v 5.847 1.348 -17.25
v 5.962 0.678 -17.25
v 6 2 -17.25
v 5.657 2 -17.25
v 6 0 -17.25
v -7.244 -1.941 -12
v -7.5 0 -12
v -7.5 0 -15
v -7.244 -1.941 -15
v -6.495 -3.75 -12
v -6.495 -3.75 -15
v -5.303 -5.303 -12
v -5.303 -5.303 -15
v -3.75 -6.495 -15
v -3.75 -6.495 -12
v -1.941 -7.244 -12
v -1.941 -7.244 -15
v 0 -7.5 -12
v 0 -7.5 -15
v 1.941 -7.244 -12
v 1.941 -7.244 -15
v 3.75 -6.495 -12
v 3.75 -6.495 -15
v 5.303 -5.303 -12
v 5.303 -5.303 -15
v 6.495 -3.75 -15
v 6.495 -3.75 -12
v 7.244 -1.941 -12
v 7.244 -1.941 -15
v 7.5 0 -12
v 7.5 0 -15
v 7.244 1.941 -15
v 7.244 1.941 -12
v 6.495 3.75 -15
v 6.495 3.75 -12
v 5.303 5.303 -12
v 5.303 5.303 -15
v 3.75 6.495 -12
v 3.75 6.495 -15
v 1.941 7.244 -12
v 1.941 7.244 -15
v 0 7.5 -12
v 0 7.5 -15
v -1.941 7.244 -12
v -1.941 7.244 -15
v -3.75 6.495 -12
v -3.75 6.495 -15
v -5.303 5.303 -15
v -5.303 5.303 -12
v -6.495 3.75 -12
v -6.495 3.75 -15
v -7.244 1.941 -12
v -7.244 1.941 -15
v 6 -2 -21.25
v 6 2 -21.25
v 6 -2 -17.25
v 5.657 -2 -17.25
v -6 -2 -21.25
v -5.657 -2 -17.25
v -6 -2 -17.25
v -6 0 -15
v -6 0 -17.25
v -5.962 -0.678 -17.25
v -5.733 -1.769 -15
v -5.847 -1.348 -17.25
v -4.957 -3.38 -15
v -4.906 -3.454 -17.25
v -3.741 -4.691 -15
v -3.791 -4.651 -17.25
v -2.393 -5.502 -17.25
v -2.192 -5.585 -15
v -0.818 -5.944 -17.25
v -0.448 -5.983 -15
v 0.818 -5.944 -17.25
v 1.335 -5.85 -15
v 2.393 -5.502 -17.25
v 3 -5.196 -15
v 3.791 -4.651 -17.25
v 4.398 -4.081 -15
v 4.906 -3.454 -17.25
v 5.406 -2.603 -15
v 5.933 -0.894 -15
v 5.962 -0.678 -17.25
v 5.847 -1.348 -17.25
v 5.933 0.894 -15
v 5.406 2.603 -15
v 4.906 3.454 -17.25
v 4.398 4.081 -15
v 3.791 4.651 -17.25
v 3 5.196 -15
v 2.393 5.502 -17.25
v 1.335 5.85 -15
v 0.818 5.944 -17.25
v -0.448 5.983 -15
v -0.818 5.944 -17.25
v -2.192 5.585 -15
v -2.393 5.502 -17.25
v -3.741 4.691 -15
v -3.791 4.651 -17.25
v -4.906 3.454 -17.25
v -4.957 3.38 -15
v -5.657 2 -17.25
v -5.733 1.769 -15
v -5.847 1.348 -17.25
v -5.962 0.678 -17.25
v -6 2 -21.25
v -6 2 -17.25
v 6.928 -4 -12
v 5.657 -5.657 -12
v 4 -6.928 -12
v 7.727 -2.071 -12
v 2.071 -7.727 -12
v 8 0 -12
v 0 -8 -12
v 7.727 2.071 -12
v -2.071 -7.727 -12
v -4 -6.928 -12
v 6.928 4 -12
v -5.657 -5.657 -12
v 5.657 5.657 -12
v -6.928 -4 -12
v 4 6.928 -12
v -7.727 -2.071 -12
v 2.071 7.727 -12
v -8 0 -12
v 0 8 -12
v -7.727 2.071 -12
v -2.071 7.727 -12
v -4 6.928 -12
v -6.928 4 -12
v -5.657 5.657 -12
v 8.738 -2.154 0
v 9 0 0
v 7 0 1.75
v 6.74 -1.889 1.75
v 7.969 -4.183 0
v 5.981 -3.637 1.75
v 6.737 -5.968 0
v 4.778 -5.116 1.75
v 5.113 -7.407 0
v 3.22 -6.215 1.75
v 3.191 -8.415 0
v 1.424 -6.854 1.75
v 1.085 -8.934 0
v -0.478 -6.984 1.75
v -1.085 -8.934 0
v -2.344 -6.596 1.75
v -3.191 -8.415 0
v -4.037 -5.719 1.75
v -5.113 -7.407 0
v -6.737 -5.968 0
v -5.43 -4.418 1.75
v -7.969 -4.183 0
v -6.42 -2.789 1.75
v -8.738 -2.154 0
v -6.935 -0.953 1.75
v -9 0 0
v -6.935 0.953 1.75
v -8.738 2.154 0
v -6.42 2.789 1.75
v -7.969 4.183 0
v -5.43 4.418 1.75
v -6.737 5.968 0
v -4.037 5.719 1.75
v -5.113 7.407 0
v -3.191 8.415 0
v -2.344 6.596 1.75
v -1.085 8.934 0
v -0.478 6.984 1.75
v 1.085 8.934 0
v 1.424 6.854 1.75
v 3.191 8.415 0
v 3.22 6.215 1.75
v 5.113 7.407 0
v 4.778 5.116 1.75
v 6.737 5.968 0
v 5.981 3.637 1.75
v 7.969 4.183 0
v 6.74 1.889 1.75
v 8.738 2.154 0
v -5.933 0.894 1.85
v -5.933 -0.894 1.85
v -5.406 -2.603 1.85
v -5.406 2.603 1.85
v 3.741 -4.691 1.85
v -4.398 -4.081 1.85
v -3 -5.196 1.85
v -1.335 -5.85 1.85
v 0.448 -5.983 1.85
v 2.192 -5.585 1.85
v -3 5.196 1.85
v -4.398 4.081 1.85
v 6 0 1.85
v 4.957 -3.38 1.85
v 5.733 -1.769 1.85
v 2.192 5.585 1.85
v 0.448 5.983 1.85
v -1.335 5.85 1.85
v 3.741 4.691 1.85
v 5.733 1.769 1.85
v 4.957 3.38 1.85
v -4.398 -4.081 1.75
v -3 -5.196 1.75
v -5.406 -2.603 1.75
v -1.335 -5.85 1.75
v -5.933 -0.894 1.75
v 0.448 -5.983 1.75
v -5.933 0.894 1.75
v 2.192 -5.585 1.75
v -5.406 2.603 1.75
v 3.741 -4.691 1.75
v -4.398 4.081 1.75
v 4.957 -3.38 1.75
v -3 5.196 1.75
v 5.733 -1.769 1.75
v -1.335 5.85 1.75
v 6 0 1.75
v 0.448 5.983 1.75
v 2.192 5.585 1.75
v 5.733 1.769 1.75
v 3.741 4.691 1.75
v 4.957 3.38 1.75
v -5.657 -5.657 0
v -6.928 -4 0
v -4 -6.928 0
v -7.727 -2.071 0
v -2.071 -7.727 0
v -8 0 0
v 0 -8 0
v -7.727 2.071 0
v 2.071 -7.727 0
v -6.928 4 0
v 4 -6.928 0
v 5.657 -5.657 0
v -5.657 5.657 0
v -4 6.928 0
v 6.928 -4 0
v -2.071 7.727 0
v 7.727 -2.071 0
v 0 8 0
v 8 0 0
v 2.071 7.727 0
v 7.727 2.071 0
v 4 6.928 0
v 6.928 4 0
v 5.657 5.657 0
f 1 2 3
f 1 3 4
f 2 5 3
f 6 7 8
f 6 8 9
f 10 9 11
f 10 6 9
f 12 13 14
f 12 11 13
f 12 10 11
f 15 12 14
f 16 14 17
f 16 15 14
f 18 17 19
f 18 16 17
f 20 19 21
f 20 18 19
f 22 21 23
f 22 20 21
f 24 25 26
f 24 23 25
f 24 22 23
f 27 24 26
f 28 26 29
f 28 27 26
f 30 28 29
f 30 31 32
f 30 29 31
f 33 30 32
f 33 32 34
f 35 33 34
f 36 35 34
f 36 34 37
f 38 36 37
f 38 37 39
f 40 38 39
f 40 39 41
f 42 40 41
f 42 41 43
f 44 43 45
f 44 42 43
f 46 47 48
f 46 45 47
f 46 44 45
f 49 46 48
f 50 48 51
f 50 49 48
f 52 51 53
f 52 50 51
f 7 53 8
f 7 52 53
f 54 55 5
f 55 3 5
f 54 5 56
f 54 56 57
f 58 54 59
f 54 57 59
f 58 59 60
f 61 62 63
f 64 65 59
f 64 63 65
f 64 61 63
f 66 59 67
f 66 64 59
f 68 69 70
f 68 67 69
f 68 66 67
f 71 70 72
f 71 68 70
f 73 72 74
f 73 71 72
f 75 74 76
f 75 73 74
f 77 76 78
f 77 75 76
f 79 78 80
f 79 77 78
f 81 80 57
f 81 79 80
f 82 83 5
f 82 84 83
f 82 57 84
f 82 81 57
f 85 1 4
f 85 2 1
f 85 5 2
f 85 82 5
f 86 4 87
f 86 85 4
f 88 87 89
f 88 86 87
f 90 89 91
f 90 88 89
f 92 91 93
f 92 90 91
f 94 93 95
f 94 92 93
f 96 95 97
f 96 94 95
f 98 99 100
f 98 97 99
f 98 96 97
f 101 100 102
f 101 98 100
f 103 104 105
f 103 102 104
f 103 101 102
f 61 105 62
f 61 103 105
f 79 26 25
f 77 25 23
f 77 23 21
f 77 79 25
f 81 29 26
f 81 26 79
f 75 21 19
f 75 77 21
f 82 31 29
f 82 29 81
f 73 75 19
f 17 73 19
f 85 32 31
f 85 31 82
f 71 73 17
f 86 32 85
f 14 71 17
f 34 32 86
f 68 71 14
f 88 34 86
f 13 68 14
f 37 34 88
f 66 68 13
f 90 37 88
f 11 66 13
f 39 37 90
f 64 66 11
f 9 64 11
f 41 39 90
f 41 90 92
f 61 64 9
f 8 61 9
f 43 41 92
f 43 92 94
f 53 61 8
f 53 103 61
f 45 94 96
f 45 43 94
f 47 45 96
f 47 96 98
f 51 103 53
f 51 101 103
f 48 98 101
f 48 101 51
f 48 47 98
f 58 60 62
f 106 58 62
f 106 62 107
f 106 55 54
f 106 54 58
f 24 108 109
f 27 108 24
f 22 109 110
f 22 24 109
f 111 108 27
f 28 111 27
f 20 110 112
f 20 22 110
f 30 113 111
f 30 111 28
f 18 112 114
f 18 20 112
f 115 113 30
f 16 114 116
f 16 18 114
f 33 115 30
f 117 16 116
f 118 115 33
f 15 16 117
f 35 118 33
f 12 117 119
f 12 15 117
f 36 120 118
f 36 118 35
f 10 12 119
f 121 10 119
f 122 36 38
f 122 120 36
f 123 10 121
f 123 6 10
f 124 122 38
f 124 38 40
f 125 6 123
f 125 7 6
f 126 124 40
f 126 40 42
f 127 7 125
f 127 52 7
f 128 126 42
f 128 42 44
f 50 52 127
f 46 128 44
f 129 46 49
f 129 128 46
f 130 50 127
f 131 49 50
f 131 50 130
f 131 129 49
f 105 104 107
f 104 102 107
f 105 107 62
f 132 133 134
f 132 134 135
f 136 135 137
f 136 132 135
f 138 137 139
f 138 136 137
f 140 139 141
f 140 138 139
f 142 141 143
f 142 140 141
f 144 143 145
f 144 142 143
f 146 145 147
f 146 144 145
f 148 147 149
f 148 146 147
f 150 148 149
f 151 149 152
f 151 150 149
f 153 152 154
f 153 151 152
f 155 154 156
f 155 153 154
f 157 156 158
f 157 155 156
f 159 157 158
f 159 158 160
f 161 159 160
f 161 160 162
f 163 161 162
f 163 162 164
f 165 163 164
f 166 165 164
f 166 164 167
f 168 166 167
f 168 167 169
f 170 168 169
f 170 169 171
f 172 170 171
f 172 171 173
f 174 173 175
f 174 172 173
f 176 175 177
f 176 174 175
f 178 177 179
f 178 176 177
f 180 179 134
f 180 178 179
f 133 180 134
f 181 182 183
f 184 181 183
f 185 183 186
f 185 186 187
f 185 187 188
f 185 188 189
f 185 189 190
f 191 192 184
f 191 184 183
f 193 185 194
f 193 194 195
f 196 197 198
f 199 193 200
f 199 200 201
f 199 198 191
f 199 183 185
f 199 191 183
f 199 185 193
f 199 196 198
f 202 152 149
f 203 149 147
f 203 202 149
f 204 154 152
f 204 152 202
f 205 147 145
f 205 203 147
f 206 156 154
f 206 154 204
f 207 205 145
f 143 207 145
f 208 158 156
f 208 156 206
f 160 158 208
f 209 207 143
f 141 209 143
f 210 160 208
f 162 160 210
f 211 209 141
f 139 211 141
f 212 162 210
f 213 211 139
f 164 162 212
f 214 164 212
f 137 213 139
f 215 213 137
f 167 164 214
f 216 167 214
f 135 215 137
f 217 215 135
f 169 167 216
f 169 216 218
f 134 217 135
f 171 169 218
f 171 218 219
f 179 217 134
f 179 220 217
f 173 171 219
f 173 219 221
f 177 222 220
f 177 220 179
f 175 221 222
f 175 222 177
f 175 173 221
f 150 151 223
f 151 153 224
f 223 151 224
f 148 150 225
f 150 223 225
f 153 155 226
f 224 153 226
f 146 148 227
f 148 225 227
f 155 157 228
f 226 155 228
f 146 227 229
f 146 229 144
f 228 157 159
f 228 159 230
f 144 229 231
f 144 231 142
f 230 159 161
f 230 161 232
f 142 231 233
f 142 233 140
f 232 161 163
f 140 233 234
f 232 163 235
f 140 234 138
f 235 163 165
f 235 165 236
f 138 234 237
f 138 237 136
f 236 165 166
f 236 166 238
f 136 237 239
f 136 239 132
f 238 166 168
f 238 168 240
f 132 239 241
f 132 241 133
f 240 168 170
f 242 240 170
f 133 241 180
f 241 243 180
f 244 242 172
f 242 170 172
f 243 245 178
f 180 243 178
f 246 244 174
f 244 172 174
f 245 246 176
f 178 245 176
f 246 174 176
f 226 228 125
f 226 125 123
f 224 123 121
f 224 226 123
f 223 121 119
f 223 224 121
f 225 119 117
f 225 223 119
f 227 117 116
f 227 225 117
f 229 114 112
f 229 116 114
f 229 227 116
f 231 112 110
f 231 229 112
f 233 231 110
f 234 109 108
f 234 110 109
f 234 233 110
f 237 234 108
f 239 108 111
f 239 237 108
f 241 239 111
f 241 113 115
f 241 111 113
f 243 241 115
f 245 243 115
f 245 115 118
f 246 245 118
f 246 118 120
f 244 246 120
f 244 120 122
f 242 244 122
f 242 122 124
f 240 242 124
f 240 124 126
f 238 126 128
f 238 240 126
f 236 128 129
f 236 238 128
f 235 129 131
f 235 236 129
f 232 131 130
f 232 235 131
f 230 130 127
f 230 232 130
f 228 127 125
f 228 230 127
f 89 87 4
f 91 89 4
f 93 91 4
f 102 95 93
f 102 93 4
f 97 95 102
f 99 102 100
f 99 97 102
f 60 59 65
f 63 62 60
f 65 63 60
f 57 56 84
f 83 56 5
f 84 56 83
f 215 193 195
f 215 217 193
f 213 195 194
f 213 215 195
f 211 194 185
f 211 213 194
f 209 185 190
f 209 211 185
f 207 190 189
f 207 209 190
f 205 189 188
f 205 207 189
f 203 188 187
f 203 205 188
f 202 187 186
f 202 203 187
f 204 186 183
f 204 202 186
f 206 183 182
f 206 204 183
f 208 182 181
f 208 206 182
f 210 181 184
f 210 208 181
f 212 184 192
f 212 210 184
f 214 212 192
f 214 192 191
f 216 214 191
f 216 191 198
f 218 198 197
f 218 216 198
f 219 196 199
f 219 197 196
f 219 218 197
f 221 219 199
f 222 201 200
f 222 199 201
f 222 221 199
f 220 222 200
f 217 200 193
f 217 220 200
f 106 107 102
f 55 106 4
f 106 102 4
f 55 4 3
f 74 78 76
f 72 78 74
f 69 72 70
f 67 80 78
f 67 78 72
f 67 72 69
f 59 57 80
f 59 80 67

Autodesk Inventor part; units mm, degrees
ref_plane "YZ Plane" through (0, 0, 0) normal (1, 0, 0) x (0, 1, 0)
ref_plane "XZ Plane" through (0, 0, 0) normal (0, 1, 0) x (-1, 0, 0)
sketch "BaseBottom" plane through (0, 0, 0) normal (0, 0, 1) x (1, 0, 0)
  circle A0 centre (0, 0) radius 9
  dimension "d0" = 18
ref_plane "TopPlane" through (0, 0, 1.75) normal (0, 0, 1) x (1, 0, 0)
sketch "BaseTop" plane through (0, 0, 1.75) normal (0, 0, 1) x (1, 0, 0)
  circle A0 centre (0, 0) radius 7
  dimension "d4" = 14
loft "BaseFeature" add profiles "BaseBottom", "BaseTop"
sketch "Light" plane through (0, 0, 1.75) normal (0, 0, 1) x (1, 0, 0)
  circle A0 centre (0, 0) radius 9 projected
  circle A1 centre (0, 0) radius 6
  dimension "d9" = 12
extrude "LightFeature" add sketch "Light" along normal blind 0.1 contours A1
sketch "Thread" plane through (0, 0, 0) normal (0, 0, -1) x (-1, 0, 0)
  circle A0 centre (0, 0) radius 8
  dimension "d12" = 16
extrude "ThreadFeature" add sketch "Thread" along normal blind 12
sketch "Body" plane through (0, 0, -12) normal (0, 0, -1) x (-1, 0, 0)
  circle A0 centre (0, 0) radius 7.5
  dimension "d15" = 15
extrude "BodyFeature" add sketch "Body" along normal blind 3
sketch "TerminalsBase" plane through (0, 0, -15) normal (0, 0, -1) x (-1, 0, 0)
  circle A0 centre (0, 0) radius 6
  dimension "d18" = 12
extrude "TerminalsBaseFeature" add sketch "TerminalsBase" along normal blind 2.25
sketch "Terminals" plane through (0, 0, -17.25) normal (0, 0, -1) x (-1, 0, 0)
  line L0 (-6, -2) -> (6, -2)
  line L1 (6, -2) -> (6, 2)
  line L2 (6, 2) -> (-6, 2)
  line L3 (-6, 2) -> (-6, -2)
  line L4 (-6, -2) -> (6, 2) construction
  line L5 (6, -2) -> (-6, 2) construction
  circle A0 centre (0, 0) radius 6 projected
  dimension "d21" = 4
extrude "TerminalsFeature" add sketch "Terminals" along normal blind 4 contours L3 A0 L0 | A0 L2 L0 | L3 L2 A0 | A0 L1 L0 | A0 L2 L1
properties part number "PilotLight"
